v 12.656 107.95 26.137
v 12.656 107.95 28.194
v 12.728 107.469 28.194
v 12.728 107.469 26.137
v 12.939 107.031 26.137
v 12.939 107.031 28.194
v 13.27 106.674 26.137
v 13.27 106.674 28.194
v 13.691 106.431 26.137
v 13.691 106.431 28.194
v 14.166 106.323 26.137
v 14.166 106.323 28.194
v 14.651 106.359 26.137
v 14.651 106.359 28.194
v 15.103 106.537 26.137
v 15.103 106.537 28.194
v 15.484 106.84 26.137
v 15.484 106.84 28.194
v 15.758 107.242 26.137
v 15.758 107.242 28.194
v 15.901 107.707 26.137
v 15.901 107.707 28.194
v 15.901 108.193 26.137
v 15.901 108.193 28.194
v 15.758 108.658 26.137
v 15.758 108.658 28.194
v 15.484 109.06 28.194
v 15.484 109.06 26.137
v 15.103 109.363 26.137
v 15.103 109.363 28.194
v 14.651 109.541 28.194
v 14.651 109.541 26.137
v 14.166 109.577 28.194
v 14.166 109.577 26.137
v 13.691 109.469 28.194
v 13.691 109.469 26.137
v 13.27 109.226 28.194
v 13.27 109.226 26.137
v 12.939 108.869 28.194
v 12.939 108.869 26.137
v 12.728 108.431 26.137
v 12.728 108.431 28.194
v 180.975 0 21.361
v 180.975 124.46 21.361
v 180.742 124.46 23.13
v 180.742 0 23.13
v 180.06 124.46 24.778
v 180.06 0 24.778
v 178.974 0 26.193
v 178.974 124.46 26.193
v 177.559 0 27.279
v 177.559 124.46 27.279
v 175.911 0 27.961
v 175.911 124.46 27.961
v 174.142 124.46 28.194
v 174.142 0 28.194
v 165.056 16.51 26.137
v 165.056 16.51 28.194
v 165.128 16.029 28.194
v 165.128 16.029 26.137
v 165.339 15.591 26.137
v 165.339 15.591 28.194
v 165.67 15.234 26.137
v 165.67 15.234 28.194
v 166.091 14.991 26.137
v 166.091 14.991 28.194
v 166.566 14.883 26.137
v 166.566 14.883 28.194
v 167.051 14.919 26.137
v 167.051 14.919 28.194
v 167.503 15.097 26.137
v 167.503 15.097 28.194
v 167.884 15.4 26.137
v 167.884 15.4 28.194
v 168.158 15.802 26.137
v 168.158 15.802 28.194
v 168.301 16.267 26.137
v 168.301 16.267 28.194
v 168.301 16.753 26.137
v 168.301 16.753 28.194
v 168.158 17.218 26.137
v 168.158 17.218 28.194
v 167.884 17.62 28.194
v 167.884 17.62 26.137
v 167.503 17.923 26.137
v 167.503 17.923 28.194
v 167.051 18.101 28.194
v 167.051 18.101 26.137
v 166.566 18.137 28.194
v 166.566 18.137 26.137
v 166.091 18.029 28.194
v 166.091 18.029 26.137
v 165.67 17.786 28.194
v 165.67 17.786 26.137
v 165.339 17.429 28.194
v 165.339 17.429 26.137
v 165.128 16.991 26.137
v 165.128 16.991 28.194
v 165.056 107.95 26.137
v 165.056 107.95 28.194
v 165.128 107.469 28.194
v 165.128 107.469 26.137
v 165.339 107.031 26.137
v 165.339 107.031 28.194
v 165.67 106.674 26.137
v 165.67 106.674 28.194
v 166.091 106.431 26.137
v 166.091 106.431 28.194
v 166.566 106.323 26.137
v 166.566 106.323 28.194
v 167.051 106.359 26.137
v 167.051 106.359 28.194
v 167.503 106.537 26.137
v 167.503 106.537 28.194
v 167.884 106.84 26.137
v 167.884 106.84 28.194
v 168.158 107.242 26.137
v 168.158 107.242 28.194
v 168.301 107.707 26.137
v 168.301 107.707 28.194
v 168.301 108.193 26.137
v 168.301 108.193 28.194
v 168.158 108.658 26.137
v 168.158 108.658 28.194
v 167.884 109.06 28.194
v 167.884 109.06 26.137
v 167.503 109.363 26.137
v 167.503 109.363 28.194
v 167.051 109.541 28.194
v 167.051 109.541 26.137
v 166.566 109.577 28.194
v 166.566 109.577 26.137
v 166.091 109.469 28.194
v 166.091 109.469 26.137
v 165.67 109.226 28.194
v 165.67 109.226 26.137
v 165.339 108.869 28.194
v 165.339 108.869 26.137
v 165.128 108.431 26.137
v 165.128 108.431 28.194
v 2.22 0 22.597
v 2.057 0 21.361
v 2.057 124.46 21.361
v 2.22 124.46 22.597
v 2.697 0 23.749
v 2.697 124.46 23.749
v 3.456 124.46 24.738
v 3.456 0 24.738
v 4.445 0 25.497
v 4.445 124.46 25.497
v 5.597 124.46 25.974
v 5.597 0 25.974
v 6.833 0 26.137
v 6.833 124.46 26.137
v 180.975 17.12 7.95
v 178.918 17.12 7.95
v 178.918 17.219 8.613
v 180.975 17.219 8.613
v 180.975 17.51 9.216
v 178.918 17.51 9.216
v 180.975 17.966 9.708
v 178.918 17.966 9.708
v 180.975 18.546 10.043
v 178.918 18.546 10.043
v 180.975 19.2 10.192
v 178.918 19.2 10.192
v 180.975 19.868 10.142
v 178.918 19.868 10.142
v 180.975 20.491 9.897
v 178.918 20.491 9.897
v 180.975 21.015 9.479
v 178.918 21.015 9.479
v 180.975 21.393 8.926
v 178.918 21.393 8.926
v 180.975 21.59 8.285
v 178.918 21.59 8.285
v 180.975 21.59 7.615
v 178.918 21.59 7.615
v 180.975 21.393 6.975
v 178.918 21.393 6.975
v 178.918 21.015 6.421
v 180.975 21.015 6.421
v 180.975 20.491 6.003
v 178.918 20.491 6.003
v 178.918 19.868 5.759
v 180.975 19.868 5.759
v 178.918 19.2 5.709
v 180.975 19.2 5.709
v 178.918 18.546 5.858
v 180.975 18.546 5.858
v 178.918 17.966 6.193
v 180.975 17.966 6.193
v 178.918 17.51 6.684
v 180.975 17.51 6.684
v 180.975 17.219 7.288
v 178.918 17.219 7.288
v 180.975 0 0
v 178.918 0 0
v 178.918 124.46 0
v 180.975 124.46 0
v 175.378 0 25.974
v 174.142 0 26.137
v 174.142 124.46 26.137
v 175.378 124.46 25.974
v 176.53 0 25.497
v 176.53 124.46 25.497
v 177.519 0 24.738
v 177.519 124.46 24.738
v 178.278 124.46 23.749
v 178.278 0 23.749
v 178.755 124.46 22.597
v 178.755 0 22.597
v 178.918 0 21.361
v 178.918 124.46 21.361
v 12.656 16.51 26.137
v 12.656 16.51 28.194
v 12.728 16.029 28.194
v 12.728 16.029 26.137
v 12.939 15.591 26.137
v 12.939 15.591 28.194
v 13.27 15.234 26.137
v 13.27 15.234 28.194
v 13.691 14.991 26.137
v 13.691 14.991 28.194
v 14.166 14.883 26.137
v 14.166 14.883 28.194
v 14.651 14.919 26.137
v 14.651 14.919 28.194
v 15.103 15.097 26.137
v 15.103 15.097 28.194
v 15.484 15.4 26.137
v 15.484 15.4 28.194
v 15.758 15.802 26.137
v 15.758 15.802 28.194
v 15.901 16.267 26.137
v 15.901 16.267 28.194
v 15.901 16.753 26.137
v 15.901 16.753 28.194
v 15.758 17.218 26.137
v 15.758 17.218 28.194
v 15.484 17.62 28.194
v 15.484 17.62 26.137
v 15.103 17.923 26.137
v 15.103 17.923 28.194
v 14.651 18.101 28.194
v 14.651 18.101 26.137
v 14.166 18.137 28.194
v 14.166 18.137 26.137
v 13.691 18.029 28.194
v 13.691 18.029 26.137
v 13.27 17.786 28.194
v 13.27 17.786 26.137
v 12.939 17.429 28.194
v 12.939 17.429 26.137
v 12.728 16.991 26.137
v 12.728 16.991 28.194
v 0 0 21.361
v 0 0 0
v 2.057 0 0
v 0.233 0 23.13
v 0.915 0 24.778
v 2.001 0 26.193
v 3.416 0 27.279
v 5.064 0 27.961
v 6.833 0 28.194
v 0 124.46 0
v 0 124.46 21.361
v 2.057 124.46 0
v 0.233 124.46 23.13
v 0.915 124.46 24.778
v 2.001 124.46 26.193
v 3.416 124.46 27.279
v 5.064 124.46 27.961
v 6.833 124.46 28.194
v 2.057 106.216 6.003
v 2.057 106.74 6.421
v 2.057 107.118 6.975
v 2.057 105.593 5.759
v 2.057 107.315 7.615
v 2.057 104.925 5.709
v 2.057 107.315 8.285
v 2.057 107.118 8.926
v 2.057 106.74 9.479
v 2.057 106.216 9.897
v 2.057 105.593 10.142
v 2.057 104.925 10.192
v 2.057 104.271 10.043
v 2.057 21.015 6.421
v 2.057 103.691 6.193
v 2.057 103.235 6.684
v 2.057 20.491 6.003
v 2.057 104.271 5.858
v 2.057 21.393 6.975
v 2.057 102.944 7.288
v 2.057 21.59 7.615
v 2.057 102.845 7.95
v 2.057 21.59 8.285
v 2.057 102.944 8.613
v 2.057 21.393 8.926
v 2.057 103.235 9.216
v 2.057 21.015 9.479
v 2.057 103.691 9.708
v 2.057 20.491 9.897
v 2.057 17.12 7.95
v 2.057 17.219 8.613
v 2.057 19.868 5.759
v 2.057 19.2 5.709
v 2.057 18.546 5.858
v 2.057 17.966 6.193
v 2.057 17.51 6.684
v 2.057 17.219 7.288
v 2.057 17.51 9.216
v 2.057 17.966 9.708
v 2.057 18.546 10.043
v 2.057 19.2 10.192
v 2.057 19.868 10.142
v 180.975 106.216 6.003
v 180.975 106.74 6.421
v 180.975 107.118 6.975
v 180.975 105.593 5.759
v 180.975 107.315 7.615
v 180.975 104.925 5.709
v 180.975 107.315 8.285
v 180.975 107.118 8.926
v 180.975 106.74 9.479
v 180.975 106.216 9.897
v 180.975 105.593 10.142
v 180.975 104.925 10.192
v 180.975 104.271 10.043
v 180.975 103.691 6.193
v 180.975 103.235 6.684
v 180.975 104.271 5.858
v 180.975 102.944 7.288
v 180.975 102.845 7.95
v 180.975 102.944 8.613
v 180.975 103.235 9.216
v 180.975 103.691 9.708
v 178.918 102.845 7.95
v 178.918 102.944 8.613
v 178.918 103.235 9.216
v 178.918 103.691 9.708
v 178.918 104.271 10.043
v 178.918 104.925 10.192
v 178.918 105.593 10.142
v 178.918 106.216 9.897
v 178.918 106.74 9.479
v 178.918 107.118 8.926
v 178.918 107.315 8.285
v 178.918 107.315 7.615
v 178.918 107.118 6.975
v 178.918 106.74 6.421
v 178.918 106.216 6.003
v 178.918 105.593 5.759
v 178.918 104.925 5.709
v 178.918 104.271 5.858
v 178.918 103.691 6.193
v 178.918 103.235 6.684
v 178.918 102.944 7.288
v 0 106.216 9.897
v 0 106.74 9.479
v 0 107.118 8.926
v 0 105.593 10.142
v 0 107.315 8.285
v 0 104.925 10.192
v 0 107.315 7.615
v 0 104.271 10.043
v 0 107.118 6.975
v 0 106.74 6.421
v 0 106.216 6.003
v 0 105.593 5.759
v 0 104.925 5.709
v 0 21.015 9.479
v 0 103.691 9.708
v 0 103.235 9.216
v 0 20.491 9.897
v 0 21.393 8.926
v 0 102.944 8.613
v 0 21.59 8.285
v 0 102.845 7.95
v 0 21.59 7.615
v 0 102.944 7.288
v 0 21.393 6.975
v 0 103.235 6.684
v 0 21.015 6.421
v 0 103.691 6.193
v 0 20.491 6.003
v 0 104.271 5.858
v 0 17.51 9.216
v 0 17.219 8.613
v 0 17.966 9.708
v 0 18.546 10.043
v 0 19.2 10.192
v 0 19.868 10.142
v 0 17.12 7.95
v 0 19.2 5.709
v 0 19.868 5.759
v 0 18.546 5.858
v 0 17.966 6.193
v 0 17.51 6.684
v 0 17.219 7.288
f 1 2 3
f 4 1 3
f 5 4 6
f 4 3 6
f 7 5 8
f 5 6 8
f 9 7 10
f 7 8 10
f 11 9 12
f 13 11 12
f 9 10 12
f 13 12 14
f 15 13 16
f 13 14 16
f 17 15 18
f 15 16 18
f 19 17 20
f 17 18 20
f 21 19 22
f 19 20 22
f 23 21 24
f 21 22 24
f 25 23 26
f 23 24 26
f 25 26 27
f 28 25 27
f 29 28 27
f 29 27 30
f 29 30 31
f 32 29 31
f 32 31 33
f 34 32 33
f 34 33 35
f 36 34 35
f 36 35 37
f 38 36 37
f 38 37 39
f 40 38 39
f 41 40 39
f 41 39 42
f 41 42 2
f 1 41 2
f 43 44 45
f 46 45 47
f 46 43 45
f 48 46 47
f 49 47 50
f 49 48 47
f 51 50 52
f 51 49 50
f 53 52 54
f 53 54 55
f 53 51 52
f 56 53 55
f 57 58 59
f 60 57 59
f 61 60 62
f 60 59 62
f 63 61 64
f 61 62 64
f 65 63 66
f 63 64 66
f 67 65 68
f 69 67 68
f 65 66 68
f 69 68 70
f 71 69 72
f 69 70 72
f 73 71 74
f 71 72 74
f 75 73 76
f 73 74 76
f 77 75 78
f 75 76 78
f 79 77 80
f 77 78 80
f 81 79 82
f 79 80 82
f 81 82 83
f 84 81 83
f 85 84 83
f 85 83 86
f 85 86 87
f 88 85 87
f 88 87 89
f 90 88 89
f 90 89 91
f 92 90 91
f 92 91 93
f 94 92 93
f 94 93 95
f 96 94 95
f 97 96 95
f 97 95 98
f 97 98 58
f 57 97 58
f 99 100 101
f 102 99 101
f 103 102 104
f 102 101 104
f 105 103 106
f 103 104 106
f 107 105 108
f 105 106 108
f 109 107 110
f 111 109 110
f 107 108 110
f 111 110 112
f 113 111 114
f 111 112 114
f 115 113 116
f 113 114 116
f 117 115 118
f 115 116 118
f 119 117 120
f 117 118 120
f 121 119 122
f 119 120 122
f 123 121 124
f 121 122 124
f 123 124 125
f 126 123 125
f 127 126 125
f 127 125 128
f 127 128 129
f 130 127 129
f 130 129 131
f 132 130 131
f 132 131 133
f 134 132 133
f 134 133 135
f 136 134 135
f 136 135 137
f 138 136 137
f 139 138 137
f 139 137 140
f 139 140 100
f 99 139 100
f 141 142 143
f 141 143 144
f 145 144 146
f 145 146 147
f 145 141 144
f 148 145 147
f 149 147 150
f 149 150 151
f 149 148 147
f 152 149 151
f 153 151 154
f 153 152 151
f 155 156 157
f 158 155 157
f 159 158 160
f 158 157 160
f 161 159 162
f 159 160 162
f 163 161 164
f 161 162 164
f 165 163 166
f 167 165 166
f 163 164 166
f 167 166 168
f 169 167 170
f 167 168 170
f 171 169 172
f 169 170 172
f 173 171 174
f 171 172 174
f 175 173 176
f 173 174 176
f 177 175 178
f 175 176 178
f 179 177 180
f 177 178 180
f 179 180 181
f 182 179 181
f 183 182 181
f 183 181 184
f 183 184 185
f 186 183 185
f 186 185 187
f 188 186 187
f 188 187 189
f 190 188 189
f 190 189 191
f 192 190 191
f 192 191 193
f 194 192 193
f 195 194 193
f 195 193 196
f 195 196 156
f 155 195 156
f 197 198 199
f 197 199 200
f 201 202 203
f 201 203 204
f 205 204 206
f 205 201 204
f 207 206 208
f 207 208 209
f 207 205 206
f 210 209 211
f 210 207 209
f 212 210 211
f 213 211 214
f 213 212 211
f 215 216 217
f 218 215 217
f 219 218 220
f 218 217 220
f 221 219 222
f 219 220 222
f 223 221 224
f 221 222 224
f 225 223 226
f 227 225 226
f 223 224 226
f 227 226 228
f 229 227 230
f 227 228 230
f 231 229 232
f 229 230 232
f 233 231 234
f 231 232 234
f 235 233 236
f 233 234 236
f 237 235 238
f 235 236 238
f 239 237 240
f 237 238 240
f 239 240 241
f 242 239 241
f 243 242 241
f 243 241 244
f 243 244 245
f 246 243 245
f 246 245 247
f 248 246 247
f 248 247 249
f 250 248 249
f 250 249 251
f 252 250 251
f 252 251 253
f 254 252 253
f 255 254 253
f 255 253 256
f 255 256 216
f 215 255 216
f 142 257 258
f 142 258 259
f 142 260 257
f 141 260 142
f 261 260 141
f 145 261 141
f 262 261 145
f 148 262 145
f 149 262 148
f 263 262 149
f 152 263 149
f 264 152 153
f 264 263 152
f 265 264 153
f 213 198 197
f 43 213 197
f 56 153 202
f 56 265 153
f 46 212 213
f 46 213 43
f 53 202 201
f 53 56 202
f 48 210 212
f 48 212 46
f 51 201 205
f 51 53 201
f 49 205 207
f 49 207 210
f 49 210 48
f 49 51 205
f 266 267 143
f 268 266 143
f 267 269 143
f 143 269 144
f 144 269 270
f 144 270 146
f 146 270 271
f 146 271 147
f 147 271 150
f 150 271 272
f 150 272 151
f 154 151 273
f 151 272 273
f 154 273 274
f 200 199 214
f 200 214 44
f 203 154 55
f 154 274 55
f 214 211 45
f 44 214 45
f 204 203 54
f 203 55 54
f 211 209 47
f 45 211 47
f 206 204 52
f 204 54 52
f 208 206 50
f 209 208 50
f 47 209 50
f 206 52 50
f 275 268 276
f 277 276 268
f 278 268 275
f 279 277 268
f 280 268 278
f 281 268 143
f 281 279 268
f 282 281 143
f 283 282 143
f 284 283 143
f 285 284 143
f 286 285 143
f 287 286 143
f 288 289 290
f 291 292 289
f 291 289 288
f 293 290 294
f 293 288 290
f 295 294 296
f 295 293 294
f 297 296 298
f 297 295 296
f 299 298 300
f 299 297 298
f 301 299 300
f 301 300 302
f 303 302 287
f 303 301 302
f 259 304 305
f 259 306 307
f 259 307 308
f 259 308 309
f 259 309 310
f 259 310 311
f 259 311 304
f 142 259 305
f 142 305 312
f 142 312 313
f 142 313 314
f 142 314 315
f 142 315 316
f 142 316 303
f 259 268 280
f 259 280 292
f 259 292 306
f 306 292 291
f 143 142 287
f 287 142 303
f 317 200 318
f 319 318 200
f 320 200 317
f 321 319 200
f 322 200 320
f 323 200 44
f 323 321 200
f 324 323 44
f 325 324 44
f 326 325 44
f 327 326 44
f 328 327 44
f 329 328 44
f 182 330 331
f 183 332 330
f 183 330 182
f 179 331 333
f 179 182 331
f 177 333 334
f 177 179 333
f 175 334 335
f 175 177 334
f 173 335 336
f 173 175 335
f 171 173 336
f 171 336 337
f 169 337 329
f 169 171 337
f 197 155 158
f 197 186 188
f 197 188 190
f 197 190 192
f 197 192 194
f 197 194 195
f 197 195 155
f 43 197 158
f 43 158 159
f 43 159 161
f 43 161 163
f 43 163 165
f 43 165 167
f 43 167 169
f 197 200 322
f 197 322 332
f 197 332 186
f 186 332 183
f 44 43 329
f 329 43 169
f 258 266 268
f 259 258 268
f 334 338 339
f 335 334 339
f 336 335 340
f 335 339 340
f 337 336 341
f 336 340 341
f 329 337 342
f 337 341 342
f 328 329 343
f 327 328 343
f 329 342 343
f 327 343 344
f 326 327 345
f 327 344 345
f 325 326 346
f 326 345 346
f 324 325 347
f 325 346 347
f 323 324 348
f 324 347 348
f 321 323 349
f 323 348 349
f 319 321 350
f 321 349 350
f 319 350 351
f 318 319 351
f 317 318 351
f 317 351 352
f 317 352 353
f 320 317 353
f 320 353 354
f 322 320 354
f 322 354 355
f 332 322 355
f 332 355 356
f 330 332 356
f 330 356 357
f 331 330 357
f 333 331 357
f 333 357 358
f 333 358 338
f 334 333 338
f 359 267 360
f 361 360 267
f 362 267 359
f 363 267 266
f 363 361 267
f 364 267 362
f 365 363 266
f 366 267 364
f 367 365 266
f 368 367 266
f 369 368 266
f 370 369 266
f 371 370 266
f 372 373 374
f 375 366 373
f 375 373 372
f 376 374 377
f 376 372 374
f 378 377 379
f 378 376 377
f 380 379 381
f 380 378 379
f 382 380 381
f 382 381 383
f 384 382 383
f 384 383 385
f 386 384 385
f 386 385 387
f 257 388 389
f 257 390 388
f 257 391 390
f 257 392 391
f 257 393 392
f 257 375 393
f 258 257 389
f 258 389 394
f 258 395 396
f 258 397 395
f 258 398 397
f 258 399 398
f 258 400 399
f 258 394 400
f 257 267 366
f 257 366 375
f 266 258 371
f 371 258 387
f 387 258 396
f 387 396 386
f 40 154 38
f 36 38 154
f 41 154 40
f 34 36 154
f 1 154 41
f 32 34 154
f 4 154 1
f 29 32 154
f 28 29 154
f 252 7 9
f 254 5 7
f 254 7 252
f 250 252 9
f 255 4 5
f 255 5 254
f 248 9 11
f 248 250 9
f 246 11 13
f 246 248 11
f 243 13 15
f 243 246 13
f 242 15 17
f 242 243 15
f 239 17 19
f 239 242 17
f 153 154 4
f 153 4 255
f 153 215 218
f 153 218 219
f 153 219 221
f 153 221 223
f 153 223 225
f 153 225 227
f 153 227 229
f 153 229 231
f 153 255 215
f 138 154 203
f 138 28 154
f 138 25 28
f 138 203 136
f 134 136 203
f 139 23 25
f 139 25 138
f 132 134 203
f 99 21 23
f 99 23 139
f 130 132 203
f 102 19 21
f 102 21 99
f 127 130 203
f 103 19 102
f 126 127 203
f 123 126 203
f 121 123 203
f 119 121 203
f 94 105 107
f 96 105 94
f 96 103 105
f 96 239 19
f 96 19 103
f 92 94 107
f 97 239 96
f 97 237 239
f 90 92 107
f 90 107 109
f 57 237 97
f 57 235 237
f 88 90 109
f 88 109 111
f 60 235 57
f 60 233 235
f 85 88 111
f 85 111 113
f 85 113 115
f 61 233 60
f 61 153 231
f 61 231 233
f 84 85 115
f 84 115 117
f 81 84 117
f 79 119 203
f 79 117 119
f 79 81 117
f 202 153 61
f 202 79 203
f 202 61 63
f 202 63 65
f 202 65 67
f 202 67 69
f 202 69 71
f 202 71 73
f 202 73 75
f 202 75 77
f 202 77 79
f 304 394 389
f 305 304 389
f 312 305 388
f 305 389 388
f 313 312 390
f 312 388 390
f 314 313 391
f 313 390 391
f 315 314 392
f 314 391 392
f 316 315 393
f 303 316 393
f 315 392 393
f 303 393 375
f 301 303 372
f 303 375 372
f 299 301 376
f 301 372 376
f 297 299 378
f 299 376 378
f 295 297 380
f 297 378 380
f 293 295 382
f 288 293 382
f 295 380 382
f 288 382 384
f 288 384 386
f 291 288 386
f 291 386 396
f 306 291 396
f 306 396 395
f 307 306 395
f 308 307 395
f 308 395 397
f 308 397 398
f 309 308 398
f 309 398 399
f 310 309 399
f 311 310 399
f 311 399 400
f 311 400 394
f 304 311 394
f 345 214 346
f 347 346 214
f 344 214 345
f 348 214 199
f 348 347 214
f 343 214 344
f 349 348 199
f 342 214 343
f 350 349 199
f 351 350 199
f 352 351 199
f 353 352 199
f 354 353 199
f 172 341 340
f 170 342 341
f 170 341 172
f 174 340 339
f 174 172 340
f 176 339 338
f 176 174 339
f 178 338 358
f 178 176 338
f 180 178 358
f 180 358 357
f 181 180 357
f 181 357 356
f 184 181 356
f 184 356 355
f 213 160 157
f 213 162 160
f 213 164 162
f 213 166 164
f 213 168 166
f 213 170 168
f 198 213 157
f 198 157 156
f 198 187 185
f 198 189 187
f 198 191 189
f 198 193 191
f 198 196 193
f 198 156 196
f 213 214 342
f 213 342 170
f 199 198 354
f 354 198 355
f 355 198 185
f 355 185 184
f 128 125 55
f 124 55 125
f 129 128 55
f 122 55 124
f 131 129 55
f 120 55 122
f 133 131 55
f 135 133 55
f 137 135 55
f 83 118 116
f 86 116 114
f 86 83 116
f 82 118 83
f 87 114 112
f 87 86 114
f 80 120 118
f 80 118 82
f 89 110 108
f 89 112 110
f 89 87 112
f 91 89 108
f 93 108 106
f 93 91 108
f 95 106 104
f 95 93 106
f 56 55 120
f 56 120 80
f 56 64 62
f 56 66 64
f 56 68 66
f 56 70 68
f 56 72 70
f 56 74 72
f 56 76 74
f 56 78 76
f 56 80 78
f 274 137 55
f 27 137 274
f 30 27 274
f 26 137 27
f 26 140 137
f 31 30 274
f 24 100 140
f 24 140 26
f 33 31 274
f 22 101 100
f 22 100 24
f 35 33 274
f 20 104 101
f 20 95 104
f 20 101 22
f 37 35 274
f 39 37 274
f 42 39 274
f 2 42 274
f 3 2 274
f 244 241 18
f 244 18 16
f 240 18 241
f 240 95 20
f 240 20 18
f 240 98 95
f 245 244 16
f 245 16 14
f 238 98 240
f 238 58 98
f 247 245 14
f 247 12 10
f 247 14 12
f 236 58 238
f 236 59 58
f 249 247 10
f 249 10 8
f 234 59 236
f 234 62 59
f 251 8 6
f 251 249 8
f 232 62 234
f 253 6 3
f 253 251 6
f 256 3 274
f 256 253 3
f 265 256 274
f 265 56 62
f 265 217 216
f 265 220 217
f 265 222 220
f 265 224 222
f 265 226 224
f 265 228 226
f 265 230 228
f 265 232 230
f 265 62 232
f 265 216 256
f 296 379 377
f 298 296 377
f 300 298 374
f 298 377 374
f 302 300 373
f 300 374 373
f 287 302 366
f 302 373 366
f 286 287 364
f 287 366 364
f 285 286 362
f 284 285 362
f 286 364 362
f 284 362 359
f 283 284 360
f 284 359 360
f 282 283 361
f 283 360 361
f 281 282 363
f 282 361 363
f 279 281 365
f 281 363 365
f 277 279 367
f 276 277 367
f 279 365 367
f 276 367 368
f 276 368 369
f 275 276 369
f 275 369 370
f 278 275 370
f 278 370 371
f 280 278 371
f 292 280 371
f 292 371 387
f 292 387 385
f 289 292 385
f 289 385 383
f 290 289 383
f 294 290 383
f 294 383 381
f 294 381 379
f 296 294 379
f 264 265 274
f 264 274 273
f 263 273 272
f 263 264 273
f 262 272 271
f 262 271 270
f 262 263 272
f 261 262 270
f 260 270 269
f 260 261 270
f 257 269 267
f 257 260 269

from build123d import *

# Parameters (mm, degrees)
F1_DEPTH = 124.46
F3_D     = 4.4958
F5_D     = 3.2639


with BuildPart() as f1:
    # F0 (on Front) → F1 (new body)
    with BuildSketch(Plane.XZ):
        with BuildLine():
            Line((0, 21.3614), (0, 0))
            Line((0, 0), (2.0574, 0))
            Line((2.0574, 0), (2.0574, 21.3614))
            ThreePointArc((2.0574, 21.3614), (3.4560236985, 24.7379763015), (6.8326, 26.1366))
            Line((6.8326, 26.1366), (174.1424, 26.1366))
            ThreePointArc((174.1424, 26.1366), (177.5189763015, 24.7379763015), (178.9176, 21.3614))
            Line((178.9176, 21.3614), (178.9176, 0))
            Line((178.9176, 0), (180.975, 0))
            Line((180.975, 0), (180.975, 21.3614))
            ThreePointArc((180.975, 21.3614), (178.9737777931, 26.1927777931), (174.1424, 28.194))
            Line((174.1424, 28.194), (6.8326, 28.194))
            ThreePointArc((6.8326, 28.194), (2.0012222069, 26.1927777931), (0, 21.3614))
        make_face()
    extrude(amount=-F1_DEPTH)

    # F3 (through all)
    with Locations(Plane.YZ.offset(180.975)):
        with Locations((19.3675, 7.9502), (105.0925, 7.9502)):
            Hole(F3_D / 2)

    # F5 (through all)
    with Locations(Plane(origin=(0, 0, 26.1366), x_dir=(1, 0, 0), z_dir=(0, 0, -1))):
        with Locations((14.2875, -16.51), (14.2875, -107.95), (166.6875, -16.51), (166.6875, -107.95)):
            Hole(F5_D / 2)


solid = f1.part
